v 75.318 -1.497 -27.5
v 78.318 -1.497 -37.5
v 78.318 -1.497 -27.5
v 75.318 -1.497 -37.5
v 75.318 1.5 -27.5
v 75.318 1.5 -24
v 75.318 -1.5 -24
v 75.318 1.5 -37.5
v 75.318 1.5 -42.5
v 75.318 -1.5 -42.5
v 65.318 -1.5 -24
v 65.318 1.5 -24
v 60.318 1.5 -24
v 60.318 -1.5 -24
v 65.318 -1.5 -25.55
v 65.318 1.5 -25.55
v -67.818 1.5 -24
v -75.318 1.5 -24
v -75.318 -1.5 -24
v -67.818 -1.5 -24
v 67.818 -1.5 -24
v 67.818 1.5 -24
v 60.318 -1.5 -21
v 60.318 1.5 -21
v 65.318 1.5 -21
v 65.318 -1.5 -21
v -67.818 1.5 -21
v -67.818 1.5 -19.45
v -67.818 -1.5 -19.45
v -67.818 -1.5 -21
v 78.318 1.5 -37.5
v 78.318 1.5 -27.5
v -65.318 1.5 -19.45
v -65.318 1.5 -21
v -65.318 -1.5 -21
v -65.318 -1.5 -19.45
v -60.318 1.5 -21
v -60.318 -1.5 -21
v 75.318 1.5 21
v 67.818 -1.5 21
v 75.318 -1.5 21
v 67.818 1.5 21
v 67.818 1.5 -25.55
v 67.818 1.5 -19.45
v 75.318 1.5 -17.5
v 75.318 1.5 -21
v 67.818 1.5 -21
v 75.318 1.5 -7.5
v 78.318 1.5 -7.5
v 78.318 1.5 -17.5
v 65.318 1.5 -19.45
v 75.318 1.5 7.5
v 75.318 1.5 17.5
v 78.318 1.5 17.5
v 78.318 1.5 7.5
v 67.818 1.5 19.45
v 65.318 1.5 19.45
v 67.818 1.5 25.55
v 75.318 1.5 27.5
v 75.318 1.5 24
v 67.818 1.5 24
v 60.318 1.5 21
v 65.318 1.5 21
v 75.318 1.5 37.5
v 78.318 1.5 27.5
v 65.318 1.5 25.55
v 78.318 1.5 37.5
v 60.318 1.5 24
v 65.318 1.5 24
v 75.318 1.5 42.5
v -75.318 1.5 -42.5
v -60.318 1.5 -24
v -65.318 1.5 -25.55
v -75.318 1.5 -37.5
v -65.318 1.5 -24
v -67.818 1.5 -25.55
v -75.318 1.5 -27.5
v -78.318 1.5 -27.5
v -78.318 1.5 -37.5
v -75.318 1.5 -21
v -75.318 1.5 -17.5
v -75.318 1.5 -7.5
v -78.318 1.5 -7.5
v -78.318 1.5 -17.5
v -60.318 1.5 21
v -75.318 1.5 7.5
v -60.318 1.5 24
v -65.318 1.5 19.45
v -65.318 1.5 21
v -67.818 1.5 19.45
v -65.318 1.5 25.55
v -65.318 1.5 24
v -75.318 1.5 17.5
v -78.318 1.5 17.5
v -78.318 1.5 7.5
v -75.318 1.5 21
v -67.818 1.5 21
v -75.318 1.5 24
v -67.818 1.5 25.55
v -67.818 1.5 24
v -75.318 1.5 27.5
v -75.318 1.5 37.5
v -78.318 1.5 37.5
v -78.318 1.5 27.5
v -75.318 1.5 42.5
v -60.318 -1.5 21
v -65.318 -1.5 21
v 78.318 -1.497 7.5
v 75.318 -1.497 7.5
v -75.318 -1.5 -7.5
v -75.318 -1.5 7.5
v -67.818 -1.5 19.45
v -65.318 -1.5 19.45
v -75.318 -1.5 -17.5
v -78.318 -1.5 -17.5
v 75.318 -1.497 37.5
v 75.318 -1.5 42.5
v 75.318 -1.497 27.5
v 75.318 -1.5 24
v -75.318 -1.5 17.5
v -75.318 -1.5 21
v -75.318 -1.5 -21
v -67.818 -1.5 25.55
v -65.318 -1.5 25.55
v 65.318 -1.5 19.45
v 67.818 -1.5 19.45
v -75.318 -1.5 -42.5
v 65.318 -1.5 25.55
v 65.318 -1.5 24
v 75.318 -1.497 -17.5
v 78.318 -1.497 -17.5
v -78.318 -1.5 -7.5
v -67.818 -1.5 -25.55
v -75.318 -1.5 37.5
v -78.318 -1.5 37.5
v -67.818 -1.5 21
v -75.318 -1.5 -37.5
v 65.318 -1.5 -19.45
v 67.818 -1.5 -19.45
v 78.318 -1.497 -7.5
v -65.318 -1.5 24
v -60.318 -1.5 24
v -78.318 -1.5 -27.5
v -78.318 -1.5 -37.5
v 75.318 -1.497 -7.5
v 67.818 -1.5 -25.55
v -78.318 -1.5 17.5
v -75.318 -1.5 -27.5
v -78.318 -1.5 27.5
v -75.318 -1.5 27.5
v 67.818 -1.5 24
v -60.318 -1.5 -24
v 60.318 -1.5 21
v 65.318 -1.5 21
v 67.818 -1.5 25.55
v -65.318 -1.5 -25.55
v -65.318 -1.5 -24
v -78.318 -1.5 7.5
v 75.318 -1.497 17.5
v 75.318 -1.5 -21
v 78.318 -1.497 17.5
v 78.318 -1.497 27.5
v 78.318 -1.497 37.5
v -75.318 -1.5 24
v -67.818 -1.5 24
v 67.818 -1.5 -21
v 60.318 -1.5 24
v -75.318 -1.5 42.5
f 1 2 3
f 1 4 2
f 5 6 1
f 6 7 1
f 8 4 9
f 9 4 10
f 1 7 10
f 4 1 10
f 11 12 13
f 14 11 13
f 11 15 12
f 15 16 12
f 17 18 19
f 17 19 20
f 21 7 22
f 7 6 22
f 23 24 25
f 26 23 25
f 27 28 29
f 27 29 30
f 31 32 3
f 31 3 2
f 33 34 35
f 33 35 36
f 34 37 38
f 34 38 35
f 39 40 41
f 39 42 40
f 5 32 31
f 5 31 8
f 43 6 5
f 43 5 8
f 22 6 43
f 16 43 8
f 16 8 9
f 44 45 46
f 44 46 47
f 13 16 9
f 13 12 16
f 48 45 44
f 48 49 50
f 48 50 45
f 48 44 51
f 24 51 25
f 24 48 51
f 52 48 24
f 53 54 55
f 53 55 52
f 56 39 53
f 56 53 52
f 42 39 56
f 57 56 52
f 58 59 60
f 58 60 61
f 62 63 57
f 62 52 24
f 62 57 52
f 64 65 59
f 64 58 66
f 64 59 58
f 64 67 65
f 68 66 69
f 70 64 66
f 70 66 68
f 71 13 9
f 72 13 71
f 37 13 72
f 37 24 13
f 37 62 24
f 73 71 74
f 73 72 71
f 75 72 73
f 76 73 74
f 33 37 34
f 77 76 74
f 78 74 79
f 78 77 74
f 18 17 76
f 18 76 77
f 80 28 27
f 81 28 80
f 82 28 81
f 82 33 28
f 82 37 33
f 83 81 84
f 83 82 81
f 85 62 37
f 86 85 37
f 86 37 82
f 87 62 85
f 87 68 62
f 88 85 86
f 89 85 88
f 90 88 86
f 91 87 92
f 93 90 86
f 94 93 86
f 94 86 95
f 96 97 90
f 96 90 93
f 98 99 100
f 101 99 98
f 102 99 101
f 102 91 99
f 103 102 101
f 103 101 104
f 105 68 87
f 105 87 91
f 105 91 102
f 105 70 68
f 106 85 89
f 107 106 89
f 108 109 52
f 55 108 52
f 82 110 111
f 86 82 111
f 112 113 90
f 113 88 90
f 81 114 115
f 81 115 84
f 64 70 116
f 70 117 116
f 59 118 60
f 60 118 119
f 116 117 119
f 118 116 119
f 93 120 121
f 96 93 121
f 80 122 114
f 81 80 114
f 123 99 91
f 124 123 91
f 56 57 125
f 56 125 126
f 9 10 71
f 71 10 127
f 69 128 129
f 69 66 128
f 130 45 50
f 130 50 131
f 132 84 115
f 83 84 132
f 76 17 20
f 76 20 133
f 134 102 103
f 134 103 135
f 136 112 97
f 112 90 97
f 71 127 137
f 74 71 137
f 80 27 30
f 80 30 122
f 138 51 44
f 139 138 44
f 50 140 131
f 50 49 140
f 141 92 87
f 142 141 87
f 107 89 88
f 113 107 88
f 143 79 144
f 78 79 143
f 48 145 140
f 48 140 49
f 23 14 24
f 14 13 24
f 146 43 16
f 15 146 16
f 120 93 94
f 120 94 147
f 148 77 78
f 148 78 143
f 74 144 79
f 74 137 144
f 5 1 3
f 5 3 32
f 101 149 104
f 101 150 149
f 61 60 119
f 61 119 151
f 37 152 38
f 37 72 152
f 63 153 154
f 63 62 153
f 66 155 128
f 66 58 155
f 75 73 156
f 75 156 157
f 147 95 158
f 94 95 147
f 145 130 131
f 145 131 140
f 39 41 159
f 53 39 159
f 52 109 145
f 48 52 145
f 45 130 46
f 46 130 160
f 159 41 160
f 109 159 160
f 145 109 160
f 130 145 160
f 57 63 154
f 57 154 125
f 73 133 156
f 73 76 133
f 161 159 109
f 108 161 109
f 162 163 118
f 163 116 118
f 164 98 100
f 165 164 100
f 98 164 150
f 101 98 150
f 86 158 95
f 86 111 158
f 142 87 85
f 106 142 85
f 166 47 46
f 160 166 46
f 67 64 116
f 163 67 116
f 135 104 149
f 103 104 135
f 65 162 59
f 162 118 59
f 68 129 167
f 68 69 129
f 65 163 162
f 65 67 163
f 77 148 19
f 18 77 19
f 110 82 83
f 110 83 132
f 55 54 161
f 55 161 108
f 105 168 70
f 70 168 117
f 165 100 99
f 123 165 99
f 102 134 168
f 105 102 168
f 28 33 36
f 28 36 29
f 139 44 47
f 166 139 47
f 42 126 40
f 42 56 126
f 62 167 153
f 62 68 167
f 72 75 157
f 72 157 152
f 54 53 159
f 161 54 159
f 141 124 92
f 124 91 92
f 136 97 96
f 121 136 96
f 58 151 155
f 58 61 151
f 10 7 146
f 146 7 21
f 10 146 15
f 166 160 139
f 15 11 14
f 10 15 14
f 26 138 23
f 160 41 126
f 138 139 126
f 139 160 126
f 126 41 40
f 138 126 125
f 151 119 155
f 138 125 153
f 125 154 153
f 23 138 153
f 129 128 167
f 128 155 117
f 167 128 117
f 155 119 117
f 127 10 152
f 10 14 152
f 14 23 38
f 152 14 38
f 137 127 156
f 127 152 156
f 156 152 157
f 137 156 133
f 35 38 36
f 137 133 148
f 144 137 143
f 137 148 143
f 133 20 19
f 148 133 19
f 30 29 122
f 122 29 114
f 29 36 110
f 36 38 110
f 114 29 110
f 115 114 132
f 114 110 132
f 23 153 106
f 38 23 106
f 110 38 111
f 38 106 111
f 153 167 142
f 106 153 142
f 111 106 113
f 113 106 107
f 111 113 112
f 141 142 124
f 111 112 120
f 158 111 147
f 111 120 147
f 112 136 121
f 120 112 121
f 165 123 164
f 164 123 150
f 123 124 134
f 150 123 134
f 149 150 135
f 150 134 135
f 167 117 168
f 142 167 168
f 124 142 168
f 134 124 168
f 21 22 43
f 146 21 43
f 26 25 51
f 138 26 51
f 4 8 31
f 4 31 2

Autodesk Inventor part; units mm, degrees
ref_plane "YZ Plane" through (0, 0, 0) normal (1, 0, 0) x (0, 1, 0)
ref_plane "XZ Plane" through (0, 0, 0) normal (0, 1, 0) x (-1, 0, 0)
ref_plane "XY Plane" through (0, 0, 0) normal (0, 0, 1) x (1, 0, 0)
sketch "Эскиз1" plane through (0, 0, 0) normal (0, 1, 0) x (-1, 0, 0)
  line L0 (75.318, 42.5) -> (-75.318, 42.5)
  line L1 (-75.318, 42.5) -> (-75.318, -42.5)
  line L2 (-75.318, -42.5) -> (75.318, -42.5)
  line L3 (75.318, -42.5) -> (75.318, 42.5)
  line L4 (75.318, 42.5) -> (-75.318, -42.5) construction
  line L5 (-75.318, 42.5) -> (75.318, -42.5) construction
  point P0 (0, 0)
  dimension "d0" = 150.636
  dimension "d1" = 85
extrude "Выдавливание1" add sketch "Эскиз1" along normal mid plane 3
sketch "Эскиз3" plane through (-75.318, -1.5, 42.5) normal (-1, 0, 0) x (0, 0, 1)
  line L0 (-85, 0) -> (0, 0) projected
  line L1 (-80, 3) -> (-70, 3)
  line L2 (-70, 3) -> (-70, 0)
  line L3 (-70, 0) -> (-80, 0)
  line L4 (-80, 0) -> (-80, 3)
  line L5 (-80, 3) -> (-70, 0) construction
  line L6 (-70, 3) -> (-80, 0) construction
  line L7 (-60, 3) -> (-50, 3)
  line L8 (-50, 3) -> (-50, 0)
  line L9 (-50, 0) -> (-60, 0)
  line L10 (-60, 0) -> (-60, 3)
  line L11 (-60, 3) -> (-50, 0) construction
  line L12 (-50, 3) -> (-60, 0) construction
  line L13 (-35, 3) -> (-25, 3)
  line L14 (-25, 3) -> (-25, 0)
  line L15 (-25, 0) -> (-35, 0)
  line L16 (-35, 0) -> (-35, 3)
  line L17 (-35, 3) -> (-25, 0) construction
  line L18 (-25, 3) -> (-35, 0) construction
  line L19 (-15, 3) -> (-5, 3)
  line L20 (-5, 3) -> (-5, 0)
  line L21 (-5, 0) -> (-15, 0)
  line L22 (-15, 0) -> (-15, 3)
  line L23 (-15, 3) -> (-5, 0) construction
  line L24 (-5, 3) -> (-15, 0) construction
  line L25 (0, 0) -> (0, 3) projected
  line L26 (-85, 0) -> (-85, 3) projected
  point P0 (-42.5, 1.5)
  point P1 (-75, 1.5)
  point P2 (-55, 1.5)
  point P3 (-30, 1.5)
  point P4 (-10, 1.5)
  point P5 (-15, 1.5)
  point P6 (-25, 1.5)
  point P7 (-60, 1.5)
  point P8 (-35, 0)
  point P9 (-15, 0)
  dimension "d8" = 10
  dimension "d9" = 10
  dimension "d10" = 10
  dimension "d11" = 10
  dimension "d12" = 3
  dimension "d13" = 10
  dimension "d14" = 10
  dimension "d15" = 5
  dimension "d16" = 5
extrude "Выдавливание3" add sketch "Эскиз3" along normal blind 3
sketch "Эскиз4" plane through (75.318, -1.5, -42.5) normal (1, 0, 0) x (0, 0, -1)
  line L0 (-85, 3) -> (0, 3) projected
  line L1 (-80, 0.0026) -> (-70, 0.0026)
  line L2 (-70, 0.0026) -> (-70, 3)
  line L3 (-70, 3) -> (-80, 3)
  line L4 (-80, 3) -> (-80, 0.0026)
  line L5 (-80, 0.0026) -> (-70, 3) construction
  line L6 (-70, 0.0026) -> (-80, 3) construction
  line L7 (-60, 0.0026) -> (-50, 0.0026)
  line L8 (-50, 0.0026) -> (-50, 3)
  line L9 (-50, 3) -> (-60, 3)
  line L10 (-60, 3) -> (-60, 0.0026)
  line L11 (-60, 0.0026) -> (-50, 3) construction
  line L12 (-50, 0.0026) -> (-60, 3) construction
  line L13 (-42.5, 3) -> (-42.5, 0) construction
  line L14 (0, 0) -> (-85, 0) projected
  line L15 (-5, 0.0026) -> (-15, 0.0026)
  line L16 (-15, 0.0026) -> (-15, 3)
  line L17 (-15, 3) -> (-5, 3)
  line L18 (-5, 3) -> (-5, 0.0026)
  line L19 (-5, 0.0026) -> (-15, 3) construction
  line L20 (-15, 0.0026) -> (-5, 3) construction
  line L21 (-25, 0.0026) -> (-35, 0.0026)
  line L22 (-35, 0.0026) -> (-35, 3)
  line L23 (-35, 3) -> (-25, 3)
  line L24 (-25, 3) -> (-25, 0.0026)
  line L25 (-25, 0.0026) -> (-35, 3) construction
  line L26 (-35, 0.0026) -> (-25, 3) construction
  line L27 (-85, 3) -> (-85, 0) projected
  point P0 (-42.5, 1.5)
  point P1 (-75, 1.5013)
  point P2 (-55, 1.5013)
  point P3 (-10, 1.5013)
  point P4 (-30, 1.5013)
  point P5 (-35, 3)
  point P6 (-5, 3)
  point P7 (-15, 3)
  dimension "d19" = 10
  dimension "d24" = 20
  dimension "d29" = 5
extrude "Выдавливание4" add sketch "Эскиз4" along normal blind 3
sketch "Эскиз5" plane through (0, 1.5, 0) normal (0, 1, 0) x (1, 0, 0)
  line L0 (-75.318, 7.5) -> (-75.318, -7.5) projected
  line L1 (-54.4999, -2.8628) -> (-54.4999, -9.8628)
  line L2 (-54.4999, -9.8628) -> (-48.4999, -9.8628)
  line L3 (-48.4999, -9.8628) -> (-48.4999, -2.8628)
  line L4 (-48.4999, -2.8628) -> (-54.4999, -2.8628)
  line L5 (-48.4999, 3.1372) -> (-48.4999, 10.1372)
  line L6 (-48.4999, 10.1372) -> (-54.4999, 10.1372)
  line L7 (-54.4999, 10.1372) -> (-54.4999, 3.1372)
  line L8 (-54.4999, 3.1372) -> (-48.4999, 3.1372)
  line L9 (-51.4999, -2.8628) -> (-51.4999, 3.1372)
  circle A0 centre (-51.4999, 0.1372) radius 1.5
  point P0 (0, 0)
  dimension "d37" = 3
extrude "Выдавливание5" cut sketch "Эскиз5" against normal blind 3
sketch "Эскиз6" plane through (0, 1.5, 0) normal (0, 1, 0) x (1, 0, 0)
  line L0 (75.318, -27.5) -> (75.318, -17.5) projected
  line L1 (60.318, -24) -> (60.318, -21)
  line L2 (75.318, -21) -> (75.318, -24)
  line L3 (67.818, -25.55) -> (65.318, -25.55)
  line L4 (65.318, -19.45) -> (67.818, -19.45)
  line L5 (67.818, -19.45) -> (67.818, -21)
  line L6 (67.818, -24) -> (67.818, -25.55)
  line L7 (75.318, -24) -> (67.818, -24)
  line L8 (65.318, -24) -> (60.318, -24)
  line L9 (65.318, -25.55) -> (65.318, -24)
  line L10 (65.318, -21) -> (65.318, -19.45)
  line L11 (60.318, -21) -> (65.318, -21)
  line L12 (67.818, -21) -> (75.318, -21)
  line L13 (66.568, 0) -> (53.2147, 0) construction
  line L14 (0, -10.2584) -> (0, 8.5624) construction
  line L15 (75.318, 27.5) -> (75.318, 17.5)
  line L16 (60.318, 24) -> (60.318, 21)
  line L17 (75.318, 21) -> (75.318, 24)
  line L18 (67.818, 25.55) -> (65.318, 25.55)
  line L19 (65.318, 19.45) -> (67.818, 19.45)
  line L20 (67.818, 19.45) -> (67.818, 21)
  line L21 (67.818, 24) -> (67.818, 25.55)
  line L22 (75.318, 24) -> (67.818, 24)
  line L23 (65.318, 24) -> (60.318, 24)
  line L24 (65.318, 25.55) -> (65.318, 24)
  line L25 (65.318, 21) -> (65.318, 19.45)
  line L26 (60.318, 21) -> (65.318, 21)
  line L27 (67.818, 21) -> (75.318, 21)
  line L28 (0, 10.2584) -> (0, -8.5624) construction
  line L29 (-75.318, -27.5) -> (-75.318, -17.5)
  line L30 (-60.318, -24) -> (-60.318, -21)
  line L31 (-75.318, -21) -> (-75.318, -24)
  line L32 (-67.818, -25.55) -> (-65.318, -25.55)
  line L33 (-65.318, -19.45) -> (-67.818, -19.45)
  line L34 (-67.818, -19.45) -> (-67.818, -21)
  line L35 (-67.818, -24) -> (-67.818, -25.55)
  line L36 (-75.318, -24) -> (-67.818, -24)
  line L37 (-65.318, -24) -> (-60.318, -24)
  line L38 (-65.318, -25.55) -> (-65.318, -24)
  line L39 (-65.318, -21) -> (-65.318, -19.45)
  line L40 (-60.318, -21) -> (-65.318, -21)
  line L41 (-67.818, -21) -> (-75.318, -21)
  line L42 (-66.568, 0) -> (-53.2147, 0) construction
  line L43 (-60.318, 24) -> (-60.318, 21)
  line L44 (-65.318, 24) -> (-60.318, 24)
  line L45 (-60.318, 21) -> (-65.318, 21)
  line L46 (-65.318, 21) -> (-65.318, 19.45)
  line L47 (-65.318, 19.45) -> (-67.818, 19.45)
  line L48 (-67.818, 19.45) -> (-67.818, 21)
  line L49 (-65.318, 25.55) -> (-65.318, 24)
  line L50 (-67.818, 25.55) -> (-65.318, 25.55)
  line L51 (-67.818, 24) -> (-67.818, 25.55)
  line L52 (-67.818, 21) -> (-75.318, 21)
  line L53 (-75.318, 21) -> (-75.318, 24)
  line L54 (-75.318, 27.5) -> (-75.318, 17.5)
  line L55 (-75.318, 24) -> (-67.818, 24)
  point P0 (0, 0)
  point P1 (67.818, -23.3834)
  point P2 (67.818, 23.3834)
  point P3 (-67.818, -23.3834)
  point P4 (-67.818, 23.3834)
  point P5 (-75.318, -21)
  point P6 (75.318, -22.5)
  dimension "d38" = 6.1
  dimension "d39" = 3
  dimension "d40" = 2.5
  dimension "d41" = 15
  dimension "d42" = 1.55
  dimension "d43" = 1.55
  dimension "d44" = 1.55
  dimension "d45" = 1.55
extrude "Выдавливание6" cut sketch "Эскиз6" against normal blind 3
sketch "Эскиз7" plane through (0, 1.5, 0) normal (0, 1, 0) x (1, 0, 0)
  circle A0 centre (-51.4999, 0.1372) radius 1.5 projected
  line L0 (-54.4999, -2.8628) -> (-48.4999, -2.8628) projected
  line L1 (-48.4999, -2.8628) -> (-48.4999, -9.8628) projected
  line L2 (-48.4999, -9.8628) -> (-54.4999, -9.8628) projected
  line L3 (-54.4999, -9.8628) -> (-54.4999, -2.8628) projected
  line L4 (-48.4999, 3.1372) -> (-54.4999, 3.1372) projected
  line L5 (-48.4999, 10.1372) -> (-48.4999, 3.1372) projected
  line L6 (-54.4999, 10.1372) -> (-48.4999, 10.1372) projected
  line L7 (-54.4999, 3.1372) -> (-54.4999, 10.1372) projected
  point P0 (0, 0)
extrude "Выдавливание8" add sketch "Эскиз7" against normal blind 3
properties part number "Нижняя часть головы_CPY"
